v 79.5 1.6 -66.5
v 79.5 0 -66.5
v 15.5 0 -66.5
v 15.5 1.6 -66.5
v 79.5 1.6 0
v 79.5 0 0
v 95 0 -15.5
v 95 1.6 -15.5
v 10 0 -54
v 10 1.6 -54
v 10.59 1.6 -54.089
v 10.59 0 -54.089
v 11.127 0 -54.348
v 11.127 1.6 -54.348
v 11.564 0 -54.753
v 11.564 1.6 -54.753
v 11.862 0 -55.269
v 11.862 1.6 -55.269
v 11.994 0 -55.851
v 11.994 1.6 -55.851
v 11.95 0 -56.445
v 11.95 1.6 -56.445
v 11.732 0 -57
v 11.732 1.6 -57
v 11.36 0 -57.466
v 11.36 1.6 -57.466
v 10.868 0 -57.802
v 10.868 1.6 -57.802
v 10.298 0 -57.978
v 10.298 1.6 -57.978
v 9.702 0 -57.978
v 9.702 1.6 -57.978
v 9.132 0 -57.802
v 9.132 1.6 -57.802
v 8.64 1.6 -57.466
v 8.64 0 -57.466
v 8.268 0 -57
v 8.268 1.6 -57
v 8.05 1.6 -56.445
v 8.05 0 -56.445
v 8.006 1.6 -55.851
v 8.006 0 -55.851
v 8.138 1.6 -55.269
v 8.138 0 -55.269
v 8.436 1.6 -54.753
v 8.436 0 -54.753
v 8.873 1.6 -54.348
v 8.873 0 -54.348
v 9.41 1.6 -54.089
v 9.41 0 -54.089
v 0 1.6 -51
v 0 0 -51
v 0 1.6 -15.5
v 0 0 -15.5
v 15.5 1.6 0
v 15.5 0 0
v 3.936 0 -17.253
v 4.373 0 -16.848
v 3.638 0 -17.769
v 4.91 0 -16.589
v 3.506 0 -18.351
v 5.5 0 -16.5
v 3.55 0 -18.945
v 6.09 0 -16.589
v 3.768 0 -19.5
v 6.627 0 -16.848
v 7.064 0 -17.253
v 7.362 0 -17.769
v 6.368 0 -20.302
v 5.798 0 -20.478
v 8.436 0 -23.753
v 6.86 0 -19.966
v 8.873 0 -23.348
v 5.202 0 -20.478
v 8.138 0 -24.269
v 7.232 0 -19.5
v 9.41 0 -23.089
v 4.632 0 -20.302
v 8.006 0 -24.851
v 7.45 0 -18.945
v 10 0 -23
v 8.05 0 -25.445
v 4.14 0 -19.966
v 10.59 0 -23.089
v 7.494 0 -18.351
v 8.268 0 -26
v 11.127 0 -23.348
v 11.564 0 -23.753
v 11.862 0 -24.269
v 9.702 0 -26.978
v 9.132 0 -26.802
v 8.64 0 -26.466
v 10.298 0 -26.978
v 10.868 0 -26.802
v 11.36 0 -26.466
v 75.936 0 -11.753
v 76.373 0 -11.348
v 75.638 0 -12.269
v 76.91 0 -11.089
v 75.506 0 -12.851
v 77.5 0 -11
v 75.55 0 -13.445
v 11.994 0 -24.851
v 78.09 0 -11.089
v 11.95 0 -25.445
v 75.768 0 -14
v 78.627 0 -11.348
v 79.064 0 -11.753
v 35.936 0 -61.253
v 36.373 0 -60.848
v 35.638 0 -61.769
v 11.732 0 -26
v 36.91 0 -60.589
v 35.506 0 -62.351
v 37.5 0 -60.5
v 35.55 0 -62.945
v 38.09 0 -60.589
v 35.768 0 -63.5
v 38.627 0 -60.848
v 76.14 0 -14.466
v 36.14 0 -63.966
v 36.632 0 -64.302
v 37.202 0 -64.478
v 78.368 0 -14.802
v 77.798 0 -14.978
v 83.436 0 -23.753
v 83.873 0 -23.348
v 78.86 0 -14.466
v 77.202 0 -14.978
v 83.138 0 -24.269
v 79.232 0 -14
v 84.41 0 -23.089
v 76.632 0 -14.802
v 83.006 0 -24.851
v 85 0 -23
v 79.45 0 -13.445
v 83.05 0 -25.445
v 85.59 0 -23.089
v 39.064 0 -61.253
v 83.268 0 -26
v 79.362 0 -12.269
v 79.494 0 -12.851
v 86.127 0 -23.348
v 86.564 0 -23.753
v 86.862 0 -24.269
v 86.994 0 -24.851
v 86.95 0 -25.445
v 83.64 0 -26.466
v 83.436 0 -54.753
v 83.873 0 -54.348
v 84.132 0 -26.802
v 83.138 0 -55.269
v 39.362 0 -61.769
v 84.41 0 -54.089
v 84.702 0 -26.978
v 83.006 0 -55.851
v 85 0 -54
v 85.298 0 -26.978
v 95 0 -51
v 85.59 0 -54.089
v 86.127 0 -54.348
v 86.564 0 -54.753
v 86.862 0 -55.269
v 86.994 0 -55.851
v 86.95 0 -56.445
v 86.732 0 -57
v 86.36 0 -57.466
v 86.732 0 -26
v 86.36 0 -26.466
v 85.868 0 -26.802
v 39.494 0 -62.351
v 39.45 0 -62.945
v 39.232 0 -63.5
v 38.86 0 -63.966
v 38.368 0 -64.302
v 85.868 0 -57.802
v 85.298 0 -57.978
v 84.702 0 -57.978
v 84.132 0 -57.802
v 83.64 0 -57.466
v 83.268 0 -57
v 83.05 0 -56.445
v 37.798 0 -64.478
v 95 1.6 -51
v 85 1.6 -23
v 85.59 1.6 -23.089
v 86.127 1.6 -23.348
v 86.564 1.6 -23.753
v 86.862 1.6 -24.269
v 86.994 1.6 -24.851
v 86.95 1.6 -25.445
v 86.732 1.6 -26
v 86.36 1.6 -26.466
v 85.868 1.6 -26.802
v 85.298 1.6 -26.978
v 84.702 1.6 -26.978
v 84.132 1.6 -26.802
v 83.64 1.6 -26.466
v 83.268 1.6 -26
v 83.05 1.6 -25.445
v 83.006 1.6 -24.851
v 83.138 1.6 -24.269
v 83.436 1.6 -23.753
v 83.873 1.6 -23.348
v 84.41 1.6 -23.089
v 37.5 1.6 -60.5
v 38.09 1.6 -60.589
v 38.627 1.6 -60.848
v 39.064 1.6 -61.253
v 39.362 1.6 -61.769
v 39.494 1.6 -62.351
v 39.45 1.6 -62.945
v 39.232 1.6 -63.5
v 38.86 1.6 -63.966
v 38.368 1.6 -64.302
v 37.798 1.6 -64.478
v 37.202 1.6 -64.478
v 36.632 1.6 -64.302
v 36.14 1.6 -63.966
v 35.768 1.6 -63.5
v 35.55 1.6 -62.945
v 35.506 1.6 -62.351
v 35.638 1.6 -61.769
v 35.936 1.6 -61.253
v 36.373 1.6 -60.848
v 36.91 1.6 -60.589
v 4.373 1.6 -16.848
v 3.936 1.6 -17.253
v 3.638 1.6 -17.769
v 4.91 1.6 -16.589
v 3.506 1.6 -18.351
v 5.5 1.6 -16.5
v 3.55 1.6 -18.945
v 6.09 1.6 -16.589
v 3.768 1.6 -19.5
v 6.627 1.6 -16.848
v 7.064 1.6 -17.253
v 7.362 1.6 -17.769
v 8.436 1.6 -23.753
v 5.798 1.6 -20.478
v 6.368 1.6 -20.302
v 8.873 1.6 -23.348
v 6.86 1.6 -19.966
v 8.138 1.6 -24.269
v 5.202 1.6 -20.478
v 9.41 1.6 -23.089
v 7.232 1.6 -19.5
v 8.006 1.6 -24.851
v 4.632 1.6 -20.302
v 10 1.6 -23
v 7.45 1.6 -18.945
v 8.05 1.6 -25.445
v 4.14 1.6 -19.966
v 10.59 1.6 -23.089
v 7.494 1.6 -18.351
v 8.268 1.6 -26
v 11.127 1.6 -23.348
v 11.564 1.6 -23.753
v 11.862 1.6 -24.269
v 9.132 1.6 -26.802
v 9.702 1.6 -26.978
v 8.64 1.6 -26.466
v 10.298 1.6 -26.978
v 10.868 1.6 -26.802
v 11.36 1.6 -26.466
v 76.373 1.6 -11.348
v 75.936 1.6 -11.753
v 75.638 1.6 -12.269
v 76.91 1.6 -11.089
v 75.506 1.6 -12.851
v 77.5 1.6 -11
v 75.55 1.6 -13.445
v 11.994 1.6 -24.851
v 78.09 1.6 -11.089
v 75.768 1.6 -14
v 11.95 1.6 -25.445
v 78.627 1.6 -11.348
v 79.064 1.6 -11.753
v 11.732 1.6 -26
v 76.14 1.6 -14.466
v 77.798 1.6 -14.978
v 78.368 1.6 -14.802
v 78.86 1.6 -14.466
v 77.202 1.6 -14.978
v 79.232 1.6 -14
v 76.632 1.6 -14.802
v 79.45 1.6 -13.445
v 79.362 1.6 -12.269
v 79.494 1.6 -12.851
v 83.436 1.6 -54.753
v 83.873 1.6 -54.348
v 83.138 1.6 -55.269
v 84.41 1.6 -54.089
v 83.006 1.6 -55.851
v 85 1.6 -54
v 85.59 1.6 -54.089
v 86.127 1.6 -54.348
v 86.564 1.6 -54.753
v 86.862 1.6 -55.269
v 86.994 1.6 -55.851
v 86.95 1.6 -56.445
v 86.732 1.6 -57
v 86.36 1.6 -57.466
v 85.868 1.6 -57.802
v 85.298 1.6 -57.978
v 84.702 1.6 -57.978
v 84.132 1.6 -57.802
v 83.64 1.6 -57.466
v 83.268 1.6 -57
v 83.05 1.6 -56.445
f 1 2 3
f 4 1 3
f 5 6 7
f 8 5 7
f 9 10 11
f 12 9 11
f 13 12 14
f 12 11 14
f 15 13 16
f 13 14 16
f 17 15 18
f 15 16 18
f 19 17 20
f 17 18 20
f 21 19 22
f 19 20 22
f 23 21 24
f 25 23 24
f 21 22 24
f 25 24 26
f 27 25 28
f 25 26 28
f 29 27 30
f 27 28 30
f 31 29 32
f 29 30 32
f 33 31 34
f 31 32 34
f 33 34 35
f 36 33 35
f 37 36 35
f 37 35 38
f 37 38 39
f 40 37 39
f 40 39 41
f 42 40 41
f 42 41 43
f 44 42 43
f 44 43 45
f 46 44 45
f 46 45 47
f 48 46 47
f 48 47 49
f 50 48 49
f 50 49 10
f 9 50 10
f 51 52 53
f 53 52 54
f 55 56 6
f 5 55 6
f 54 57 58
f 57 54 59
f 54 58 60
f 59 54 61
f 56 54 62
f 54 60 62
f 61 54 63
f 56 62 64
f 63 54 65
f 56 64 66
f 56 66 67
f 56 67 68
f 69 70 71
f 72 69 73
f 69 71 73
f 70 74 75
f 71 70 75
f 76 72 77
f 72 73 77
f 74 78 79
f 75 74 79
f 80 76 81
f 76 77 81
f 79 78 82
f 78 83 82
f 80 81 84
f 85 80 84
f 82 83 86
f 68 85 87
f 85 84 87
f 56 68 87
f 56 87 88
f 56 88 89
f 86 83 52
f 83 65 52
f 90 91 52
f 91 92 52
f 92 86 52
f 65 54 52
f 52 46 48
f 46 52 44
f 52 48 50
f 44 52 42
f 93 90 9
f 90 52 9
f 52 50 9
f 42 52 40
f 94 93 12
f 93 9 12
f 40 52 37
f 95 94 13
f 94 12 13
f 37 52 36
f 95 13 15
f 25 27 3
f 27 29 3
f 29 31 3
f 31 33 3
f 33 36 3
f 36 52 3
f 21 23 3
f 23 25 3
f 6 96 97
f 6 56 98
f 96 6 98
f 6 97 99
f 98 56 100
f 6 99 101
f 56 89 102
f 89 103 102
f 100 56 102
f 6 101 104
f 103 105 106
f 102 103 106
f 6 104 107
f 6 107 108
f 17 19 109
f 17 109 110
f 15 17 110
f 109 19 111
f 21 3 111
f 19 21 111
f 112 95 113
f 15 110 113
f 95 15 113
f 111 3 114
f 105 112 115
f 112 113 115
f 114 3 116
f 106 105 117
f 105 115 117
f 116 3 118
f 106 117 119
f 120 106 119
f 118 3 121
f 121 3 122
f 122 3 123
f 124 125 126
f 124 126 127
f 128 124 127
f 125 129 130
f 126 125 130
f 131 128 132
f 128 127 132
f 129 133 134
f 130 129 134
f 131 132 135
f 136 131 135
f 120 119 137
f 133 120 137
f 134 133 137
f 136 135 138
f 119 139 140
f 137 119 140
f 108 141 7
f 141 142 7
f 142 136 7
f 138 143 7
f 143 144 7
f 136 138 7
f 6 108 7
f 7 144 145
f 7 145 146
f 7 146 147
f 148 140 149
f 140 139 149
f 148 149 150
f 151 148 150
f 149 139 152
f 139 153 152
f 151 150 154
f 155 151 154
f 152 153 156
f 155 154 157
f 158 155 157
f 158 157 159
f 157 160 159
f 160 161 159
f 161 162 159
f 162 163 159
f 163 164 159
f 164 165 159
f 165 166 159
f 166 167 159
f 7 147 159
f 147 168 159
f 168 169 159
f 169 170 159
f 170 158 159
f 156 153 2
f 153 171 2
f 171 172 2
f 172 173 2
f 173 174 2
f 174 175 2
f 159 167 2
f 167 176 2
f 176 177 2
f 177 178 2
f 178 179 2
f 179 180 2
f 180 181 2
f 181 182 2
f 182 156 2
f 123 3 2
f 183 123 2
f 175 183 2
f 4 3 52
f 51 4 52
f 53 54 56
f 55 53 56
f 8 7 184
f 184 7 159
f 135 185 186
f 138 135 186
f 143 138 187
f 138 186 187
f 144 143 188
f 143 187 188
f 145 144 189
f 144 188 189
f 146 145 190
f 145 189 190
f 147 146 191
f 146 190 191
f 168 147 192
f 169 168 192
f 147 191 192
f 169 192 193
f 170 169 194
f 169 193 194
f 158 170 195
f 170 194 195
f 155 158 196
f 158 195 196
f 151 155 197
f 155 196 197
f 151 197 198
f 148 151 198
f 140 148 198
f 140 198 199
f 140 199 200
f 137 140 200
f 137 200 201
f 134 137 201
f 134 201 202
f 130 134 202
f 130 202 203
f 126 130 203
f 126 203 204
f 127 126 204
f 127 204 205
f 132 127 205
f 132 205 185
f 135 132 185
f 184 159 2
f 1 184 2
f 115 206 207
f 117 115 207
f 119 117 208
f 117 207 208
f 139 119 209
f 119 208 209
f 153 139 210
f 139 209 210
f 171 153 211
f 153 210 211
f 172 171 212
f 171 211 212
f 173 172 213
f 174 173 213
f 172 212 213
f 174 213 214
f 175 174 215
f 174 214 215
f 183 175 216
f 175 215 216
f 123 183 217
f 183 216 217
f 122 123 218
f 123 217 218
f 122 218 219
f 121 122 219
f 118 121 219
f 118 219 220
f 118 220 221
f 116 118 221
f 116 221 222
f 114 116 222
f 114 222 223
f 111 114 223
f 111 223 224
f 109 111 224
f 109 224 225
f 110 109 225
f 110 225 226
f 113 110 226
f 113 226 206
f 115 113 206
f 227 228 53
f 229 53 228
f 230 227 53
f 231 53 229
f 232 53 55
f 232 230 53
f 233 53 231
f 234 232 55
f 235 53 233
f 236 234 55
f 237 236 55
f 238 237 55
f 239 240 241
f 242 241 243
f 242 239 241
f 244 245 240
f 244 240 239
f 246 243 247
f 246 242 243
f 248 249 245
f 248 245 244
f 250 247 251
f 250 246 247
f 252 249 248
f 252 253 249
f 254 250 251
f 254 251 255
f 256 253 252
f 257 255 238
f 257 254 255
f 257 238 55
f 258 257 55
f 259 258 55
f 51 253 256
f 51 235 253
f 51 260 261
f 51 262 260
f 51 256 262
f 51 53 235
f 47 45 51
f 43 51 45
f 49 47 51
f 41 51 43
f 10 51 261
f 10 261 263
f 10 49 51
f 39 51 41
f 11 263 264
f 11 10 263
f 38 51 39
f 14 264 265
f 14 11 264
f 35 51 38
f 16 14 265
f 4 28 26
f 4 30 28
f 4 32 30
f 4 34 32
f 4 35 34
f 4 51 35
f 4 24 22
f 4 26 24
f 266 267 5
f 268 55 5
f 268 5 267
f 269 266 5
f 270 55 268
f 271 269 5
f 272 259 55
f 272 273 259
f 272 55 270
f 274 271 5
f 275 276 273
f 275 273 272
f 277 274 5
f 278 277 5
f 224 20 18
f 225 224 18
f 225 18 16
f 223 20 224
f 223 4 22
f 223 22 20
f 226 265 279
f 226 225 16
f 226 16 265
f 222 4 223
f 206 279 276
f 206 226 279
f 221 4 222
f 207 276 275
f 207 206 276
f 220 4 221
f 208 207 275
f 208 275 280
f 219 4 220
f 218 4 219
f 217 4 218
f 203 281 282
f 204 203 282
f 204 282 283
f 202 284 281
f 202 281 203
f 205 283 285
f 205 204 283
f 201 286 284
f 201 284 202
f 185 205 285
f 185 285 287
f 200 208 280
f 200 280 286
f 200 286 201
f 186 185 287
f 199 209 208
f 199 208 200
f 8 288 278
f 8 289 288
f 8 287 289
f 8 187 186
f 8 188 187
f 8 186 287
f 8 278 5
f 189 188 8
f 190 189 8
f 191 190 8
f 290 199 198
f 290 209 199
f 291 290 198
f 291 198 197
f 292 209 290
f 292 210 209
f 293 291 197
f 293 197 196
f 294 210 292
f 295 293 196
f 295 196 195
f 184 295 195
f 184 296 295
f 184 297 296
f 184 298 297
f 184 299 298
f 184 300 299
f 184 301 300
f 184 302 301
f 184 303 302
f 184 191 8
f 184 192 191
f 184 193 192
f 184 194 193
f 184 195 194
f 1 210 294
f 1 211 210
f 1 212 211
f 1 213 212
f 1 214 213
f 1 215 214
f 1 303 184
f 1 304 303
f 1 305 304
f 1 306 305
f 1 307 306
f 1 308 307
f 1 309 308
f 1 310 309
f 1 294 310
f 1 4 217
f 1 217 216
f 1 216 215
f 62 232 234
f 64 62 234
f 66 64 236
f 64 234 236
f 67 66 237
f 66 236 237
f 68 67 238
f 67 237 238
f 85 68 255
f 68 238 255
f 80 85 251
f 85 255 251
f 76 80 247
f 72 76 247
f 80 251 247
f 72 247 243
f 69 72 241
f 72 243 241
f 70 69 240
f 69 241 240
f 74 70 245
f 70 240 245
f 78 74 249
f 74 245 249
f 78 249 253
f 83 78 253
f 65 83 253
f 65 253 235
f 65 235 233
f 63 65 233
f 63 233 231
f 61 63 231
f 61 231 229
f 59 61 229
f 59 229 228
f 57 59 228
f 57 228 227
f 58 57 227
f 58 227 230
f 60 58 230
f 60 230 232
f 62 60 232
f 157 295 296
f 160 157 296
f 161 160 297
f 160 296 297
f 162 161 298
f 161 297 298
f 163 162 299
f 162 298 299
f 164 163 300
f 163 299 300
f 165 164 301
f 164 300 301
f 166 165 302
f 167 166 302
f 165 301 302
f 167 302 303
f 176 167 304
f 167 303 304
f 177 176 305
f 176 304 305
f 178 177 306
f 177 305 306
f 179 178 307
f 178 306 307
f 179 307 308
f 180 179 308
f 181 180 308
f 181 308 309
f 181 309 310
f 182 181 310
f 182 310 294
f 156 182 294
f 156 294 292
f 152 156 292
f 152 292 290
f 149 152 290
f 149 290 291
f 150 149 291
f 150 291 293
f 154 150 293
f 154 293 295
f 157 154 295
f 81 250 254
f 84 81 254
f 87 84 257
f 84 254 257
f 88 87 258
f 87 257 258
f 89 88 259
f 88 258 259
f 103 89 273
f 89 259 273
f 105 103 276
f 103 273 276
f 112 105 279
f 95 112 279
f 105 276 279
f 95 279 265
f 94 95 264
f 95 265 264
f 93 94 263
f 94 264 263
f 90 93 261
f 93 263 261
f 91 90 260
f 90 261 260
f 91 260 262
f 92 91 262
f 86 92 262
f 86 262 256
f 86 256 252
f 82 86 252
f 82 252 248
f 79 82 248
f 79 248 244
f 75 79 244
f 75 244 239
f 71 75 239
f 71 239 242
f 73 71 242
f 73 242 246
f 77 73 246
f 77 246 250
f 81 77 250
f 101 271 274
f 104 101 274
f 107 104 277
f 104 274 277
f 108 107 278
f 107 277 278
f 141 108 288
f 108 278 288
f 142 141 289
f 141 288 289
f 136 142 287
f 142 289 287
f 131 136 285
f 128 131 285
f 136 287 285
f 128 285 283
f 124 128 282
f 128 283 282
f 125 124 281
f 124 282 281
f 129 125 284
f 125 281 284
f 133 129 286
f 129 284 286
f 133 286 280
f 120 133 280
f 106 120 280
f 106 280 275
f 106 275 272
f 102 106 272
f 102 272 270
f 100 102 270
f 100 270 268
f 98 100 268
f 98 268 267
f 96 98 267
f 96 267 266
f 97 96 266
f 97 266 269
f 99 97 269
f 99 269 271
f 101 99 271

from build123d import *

# Parameters (mm, degrees)
BOSS_EXTRUDE1_DEPTH = 1.6
SKETCH2_R           = 2
CUT_EXTRUDE1_DEPTH  = 116.973315896
CUT_EXTRUDE2_REACH  = 117.973
SKETCH3_R           = 2


with BuildPart() as part:
    # Sketch1 → Boss-Extrude1 (new body)
    with BuildSketch(Plane(origin=(0, 0, 0), x_dir=(1, 0, 0), z_dir=(0, 1, 0))):
        Polygon((0, 15.5), (15.5, 0), (79.5, 0), (95, 15.5), (95, 51), (79.5, 66.5), (15.5, 66.5), (0, 51), align=None)
    extrude(amount=BOSS_EXTRUDE1_DEPTH)

    # Sketch2 → Cut-Extrude1 (cut, through all)
    with BuildSketch(Plane(origin=(0, 1.6, 0), x_dir=(1, 0, 0), z_dir=(0, 1, 0))):
        with Locations(Location((5.5, 18.5, 0), (0, 0, 270))):
            Circle(SKETCH2_R)
        with Locations(Location((77.5, 13, 0), (0, 0, 270))):
            Circle(SKETCH2_R)
        with Locations(Location((37.5, 62.5, 0), (0, 0, 270))):
            Circle(SKETCH2_R)
    extrude(amount=-CUT_EXTRUDE1_DEPTH, mode=Mode.SUBTRACT)

    # Sketch3 → Cut-Extrude2 (cut, up to next)
    with BuildSketch(Plane(origin=(0, 1.6, 0), x_dir=(1, 0, 0), z_dir=(0, 1, 0)), mode=Mode.PRIVATE) as cut_extrude2_sk1:
        with Locations(Location((10, 56, 0), (0, 0, 270))):
            Circle(SKETCH3_R)
    cut_extrude2_tool1 = extrude(cut_extrude2_sk1.sketch, amount=-CUT_EXTRUDE2_REACH, mode=Mode.PRIVATE) & part.part
    # Sketch3 → Cut-Extrude2 (cut, up to next)
    with BuildSketch(Plane(origin=(0, 1.6, 0), x_dir=(1, 0, 0), z_dir=(0, 1, 0)), mode=Mode.PRIVATE) as cut_extrude2_sk2:
        with Locations(Location((85, 56, 0), (0, 0, 270))):
            Circle(SKETCH3_R)
    cut_extrude2_tool2 = extrude(cut_extrude2_sk2.sketch, amount=-CUT_EXTRUDE2_REACH, mode=Mode.PRIVATE) & part.part
    # Sketch3 → Cut-Extrude2 (cut, up to next)
    with BuildSketch(Plane(origin=(0, 1.6, 0), x_dir=(1, 0, 0), z_dir=(0, 1, 0)), mode=Mode.PRIVATE) as cut_extrude2_sk3:
        with Locations(Location((85, 25, 0), (0, 0, 270))):
            Circle(SKETCH3_R)
    cut_extrude2_tool3 = extrude(cut_extrude2_sk3.sketch, amount=-CUT_EXTRUDE2_REACH, mode=Mode.PRIVATE) & part.part
    # Sketch3 → Cut-Extrude2 (cut, up to next)
    with BuildSketch(Plane(origin=(0, 1.6, 0), x_dir=(1, 0, 0), z_dir=(0, 1, 0)), mode=Mode.PRIVATE) as cut_extrude2_sk4:
        with Locations(Location((10, 25, 0), (0, 0, 270))):
            Circle(SKETCH3_R)
    cut_extrude2_tool4 = extrude(cut_extrude2_sk4.sketch, amount=-CUT_EXTRUDE2_REACH, mode=Mode.PRIVATE) & part.part
    add(cut_extrude2_tool1.solids().sort_by_distance((10, 1.6, -56))[0], mode=Mode.SUBTRACT)
    add(cut_extrude2_tool2.solids().sort_by_distance((85, 1.6, -56))[0], mode=Mode.SUBTRACT)
    add(cut_extrude2_tool3.solids().sort_by_distance((85, 1.6, -25))[0], mode=Mode.SUBTRACT)
    add(cut_extrude2_tool4.solids().sort_by_distance((10, 1.6, -25))[0], mode=Mode.SUBTRACT)


solid = part.part
